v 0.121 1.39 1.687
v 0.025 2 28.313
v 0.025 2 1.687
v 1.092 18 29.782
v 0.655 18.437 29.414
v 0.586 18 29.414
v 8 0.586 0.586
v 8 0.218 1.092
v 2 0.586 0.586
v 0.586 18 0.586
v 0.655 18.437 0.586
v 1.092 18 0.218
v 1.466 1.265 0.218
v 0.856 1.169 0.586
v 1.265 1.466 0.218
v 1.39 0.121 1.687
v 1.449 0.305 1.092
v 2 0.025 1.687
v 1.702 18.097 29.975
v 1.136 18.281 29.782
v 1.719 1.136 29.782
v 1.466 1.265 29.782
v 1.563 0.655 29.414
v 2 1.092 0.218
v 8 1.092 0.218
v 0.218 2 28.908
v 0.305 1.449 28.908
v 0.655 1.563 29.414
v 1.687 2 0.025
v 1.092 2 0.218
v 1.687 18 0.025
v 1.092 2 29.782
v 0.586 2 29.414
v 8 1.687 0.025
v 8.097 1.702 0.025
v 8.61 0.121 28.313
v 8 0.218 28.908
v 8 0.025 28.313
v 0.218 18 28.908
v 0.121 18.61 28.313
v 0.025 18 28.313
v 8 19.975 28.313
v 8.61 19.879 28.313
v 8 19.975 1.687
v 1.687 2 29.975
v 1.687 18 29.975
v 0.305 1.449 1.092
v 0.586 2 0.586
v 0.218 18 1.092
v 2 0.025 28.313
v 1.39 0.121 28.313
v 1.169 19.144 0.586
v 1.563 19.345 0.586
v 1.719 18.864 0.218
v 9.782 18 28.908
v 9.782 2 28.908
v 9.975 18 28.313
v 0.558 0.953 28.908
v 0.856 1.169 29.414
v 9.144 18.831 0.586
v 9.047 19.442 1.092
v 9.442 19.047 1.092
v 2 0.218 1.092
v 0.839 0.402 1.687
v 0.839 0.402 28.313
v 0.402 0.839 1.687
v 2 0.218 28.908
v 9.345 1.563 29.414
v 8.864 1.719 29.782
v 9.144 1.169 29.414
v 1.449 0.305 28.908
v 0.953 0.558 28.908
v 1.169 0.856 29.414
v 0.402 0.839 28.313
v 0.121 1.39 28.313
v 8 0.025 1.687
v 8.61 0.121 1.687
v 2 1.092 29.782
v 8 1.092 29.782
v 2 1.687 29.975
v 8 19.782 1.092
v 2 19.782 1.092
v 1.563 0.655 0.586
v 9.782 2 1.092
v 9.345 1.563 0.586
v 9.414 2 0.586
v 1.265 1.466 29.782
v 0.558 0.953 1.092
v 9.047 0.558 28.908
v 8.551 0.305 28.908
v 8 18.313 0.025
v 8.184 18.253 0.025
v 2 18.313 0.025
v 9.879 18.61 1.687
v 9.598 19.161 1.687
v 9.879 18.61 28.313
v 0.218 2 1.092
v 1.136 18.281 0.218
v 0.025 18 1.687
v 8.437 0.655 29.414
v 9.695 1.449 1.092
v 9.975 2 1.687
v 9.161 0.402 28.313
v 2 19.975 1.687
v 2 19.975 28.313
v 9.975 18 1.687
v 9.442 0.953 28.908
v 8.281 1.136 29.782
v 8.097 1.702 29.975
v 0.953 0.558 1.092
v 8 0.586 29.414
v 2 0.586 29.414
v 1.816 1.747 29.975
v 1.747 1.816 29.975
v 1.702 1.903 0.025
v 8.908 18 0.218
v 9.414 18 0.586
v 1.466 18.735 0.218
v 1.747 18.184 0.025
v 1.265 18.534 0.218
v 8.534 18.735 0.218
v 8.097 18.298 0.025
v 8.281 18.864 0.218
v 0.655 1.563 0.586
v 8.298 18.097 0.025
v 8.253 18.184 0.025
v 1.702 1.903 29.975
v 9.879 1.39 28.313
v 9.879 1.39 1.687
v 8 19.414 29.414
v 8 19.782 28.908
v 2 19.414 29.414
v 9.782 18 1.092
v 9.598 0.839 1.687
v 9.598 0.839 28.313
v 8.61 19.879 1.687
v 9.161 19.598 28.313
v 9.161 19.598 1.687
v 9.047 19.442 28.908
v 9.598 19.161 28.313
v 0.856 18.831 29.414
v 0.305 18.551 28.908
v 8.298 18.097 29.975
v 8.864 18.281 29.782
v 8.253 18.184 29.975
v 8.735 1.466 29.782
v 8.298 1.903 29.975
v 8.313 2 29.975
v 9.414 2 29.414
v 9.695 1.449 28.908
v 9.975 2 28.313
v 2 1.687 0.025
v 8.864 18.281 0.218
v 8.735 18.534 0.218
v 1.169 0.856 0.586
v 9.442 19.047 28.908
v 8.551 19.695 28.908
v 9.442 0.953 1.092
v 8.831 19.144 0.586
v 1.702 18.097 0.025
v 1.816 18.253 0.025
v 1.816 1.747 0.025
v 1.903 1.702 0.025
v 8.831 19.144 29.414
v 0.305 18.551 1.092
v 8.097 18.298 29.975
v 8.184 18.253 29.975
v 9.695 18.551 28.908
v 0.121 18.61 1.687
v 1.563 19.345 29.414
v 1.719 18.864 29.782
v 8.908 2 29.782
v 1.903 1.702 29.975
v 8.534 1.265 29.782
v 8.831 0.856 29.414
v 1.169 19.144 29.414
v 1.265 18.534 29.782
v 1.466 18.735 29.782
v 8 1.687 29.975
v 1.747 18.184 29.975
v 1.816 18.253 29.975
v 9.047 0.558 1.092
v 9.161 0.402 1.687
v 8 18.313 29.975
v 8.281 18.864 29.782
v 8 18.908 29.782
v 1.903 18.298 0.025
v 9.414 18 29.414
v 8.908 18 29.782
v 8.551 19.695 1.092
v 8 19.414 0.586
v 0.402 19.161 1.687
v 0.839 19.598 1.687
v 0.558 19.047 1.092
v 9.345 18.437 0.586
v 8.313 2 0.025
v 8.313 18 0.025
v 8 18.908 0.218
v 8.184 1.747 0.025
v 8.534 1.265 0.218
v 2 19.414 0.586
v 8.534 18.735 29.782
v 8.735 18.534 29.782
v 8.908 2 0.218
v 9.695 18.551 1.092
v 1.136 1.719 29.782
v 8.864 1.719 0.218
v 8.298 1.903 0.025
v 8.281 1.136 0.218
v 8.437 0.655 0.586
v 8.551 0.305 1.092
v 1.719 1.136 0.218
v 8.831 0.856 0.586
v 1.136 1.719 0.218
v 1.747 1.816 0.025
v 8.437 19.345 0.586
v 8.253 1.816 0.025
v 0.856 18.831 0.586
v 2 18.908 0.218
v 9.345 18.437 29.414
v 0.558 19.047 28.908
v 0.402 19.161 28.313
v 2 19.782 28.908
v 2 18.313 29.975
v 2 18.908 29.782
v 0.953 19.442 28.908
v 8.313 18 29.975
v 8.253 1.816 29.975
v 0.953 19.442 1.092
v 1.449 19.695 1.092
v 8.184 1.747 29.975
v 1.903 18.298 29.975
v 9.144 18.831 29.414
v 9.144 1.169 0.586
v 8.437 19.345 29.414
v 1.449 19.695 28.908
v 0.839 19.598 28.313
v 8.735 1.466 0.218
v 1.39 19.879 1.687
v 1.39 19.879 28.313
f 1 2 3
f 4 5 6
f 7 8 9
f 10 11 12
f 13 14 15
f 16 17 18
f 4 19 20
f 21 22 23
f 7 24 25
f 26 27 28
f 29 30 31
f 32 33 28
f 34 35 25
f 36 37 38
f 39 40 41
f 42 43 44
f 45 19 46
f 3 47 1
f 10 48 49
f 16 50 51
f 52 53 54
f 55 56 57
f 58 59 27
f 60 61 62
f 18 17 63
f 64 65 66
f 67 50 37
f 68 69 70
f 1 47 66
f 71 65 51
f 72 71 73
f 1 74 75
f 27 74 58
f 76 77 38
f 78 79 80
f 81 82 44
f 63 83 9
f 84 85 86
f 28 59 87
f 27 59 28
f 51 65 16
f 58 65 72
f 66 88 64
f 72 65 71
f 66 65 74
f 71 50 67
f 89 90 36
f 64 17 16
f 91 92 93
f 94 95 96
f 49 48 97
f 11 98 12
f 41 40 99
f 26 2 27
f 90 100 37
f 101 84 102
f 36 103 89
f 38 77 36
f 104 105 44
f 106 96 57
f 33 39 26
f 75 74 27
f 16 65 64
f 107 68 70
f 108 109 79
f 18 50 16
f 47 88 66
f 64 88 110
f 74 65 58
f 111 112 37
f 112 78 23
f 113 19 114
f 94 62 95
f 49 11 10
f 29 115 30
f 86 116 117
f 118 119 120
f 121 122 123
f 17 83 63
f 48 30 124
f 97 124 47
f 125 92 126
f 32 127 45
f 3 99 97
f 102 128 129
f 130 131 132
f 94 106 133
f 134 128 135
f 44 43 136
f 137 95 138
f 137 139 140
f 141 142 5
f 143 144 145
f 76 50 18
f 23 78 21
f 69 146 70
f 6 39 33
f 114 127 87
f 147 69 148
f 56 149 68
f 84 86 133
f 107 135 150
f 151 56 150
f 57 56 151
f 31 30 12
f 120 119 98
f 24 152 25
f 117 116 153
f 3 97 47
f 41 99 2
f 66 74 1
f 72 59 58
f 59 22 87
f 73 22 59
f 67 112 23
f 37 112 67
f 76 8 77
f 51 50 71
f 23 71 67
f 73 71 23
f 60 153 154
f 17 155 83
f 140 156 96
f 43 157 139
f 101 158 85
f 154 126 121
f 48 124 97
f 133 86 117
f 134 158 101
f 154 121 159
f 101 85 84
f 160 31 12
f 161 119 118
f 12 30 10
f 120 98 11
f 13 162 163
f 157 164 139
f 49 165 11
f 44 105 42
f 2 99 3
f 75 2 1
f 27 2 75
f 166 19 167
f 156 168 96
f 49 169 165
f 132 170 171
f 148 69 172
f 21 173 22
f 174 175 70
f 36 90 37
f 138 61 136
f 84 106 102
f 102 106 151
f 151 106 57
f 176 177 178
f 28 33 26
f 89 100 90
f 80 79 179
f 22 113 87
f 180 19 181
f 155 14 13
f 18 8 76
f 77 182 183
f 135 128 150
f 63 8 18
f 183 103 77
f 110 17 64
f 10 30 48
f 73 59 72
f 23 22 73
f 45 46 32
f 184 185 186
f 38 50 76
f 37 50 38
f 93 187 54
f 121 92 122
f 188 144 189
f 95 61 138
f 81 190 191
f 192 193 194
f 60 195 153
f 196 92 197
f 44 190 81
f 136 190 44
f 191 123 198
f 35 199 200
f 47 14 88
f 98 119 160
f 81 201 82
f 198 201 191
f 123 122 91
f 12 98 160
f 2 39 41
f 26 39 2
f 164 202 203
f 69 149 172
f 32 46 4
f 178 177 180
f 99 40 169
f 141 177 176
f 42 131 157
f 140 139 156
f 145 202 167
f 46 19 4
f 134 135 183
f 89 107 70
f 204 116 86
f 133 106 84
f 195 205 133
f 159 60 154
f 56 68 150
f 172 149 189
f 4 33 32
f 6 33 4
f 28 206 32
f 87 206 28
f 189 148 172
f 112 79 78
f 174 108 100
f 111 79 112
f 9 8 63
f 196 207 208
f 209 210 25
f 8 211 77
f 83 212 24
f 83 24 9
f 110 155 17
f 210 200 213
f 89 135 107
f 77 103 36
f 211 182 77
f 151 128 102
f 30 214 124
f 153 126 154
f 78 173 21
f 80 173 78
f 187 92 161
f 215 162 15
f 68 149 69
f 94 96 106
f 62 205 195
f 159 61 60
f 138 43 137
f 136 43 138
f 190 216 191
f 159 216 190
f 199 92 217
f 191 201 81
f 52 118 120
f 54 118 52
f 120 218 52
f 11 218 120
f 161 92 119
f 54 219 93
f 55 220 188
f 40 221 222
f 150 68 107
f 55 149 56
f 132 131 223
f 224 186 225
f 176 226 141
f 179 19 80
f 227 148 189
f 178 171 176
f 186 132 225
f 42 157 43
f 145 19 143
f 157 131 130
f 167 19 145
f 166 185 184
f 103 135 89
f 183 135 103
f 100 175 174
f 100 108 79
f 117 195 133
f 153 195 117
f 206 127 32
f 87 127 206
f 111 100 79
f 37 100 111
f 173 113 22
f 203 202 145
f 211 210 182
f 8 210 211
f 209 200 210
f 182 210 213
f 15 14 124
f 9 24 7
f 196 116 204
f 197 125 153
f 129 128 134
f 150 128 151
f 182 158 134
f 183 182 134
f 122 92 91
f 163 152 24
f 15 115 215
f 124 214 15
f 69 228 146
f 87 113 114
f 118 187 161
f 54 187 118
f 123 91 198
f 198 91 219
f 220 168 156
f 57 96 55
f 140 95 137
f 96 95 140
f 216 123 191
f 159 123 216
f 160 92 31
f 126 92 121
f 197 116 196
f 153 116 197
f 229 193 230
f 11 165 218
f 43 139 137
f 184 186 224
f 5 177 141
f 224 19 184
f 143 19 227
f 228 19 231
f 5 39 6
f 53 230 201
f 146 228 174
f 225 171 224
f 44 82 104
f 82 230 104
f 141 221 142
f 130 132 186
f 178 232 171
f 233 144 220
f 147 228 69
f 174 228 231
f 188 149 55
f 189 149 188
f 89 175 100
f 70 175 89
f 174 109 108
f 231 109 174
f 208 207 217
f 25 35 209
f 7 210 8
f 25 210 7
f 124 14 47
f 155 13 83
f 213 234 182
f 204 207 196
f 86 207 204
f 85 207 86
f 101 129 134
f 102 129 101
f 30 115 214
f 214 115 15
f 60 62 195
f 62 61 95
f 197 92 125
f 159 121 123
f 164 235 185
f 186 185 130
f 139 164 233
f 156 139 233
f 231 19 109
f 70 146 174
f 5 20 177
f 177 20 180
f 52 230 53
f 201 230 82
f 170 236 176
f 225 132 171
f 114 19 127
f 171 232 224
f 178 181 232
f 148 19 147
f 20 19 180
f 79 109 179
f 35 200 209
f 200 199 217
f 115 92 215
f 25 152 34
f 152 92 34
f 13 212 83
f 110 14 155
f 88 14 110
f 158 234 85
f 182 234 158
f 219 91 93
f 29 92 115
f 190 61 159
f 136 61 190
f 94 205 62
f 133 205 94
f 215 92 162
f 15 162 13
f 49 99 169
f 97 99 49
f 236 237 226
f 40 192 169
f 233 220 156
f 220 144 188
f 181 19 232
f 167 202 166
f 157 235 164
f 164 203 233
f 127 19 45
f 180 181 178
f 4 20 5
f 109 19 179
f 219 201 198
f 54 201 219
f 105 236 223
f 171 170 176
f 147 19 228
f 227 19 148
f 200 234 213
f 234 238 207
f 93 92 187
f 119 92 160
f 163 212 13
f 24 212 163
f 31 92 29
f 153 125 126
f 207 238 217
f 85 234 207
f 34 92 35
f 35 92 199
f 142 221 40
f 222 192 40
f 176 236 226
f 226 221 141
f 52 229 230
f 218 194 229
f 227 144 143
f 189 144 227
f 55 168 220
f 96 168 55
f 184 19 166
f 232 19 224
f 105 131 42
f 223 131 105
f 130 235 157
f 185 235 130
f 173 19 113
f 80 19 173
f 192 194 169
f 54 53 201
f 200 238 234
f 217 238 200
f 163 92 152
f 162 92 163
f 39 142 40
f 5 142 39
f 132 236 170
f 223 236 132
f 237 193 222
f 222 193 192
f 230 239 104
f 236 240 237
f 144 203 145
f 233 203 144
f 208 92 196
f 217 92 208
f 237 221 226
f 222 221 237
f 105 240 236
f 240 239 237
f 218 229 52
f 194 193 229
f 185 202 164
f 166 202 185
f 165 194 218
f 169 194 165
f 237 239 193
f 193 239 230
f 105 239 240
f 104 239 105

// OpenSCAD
module rCube(x,y,z,rd,fn){
    $fn=fn;
    hull(){
        translate([rd,rd,rd]) sphere(rd);
        translate([x-rd,rd,rd]) sphere(rd);
        translate([x-rd,y-rd,rd]) sphere(rd);
        translate([rd,y-rd,rd]) sphere(rd);
        translate([rd,rd,z-rd]) sphere(rd);
        translate([x-rd,rd,z-rd]) sphere(rd);
        translate([x-rd,y-rd,z-rd]) sphere(rd);
        translate([rd,y-rd,z-rd]) sphere(rd);
    }
}

rCube(10,20,30,2,20);
